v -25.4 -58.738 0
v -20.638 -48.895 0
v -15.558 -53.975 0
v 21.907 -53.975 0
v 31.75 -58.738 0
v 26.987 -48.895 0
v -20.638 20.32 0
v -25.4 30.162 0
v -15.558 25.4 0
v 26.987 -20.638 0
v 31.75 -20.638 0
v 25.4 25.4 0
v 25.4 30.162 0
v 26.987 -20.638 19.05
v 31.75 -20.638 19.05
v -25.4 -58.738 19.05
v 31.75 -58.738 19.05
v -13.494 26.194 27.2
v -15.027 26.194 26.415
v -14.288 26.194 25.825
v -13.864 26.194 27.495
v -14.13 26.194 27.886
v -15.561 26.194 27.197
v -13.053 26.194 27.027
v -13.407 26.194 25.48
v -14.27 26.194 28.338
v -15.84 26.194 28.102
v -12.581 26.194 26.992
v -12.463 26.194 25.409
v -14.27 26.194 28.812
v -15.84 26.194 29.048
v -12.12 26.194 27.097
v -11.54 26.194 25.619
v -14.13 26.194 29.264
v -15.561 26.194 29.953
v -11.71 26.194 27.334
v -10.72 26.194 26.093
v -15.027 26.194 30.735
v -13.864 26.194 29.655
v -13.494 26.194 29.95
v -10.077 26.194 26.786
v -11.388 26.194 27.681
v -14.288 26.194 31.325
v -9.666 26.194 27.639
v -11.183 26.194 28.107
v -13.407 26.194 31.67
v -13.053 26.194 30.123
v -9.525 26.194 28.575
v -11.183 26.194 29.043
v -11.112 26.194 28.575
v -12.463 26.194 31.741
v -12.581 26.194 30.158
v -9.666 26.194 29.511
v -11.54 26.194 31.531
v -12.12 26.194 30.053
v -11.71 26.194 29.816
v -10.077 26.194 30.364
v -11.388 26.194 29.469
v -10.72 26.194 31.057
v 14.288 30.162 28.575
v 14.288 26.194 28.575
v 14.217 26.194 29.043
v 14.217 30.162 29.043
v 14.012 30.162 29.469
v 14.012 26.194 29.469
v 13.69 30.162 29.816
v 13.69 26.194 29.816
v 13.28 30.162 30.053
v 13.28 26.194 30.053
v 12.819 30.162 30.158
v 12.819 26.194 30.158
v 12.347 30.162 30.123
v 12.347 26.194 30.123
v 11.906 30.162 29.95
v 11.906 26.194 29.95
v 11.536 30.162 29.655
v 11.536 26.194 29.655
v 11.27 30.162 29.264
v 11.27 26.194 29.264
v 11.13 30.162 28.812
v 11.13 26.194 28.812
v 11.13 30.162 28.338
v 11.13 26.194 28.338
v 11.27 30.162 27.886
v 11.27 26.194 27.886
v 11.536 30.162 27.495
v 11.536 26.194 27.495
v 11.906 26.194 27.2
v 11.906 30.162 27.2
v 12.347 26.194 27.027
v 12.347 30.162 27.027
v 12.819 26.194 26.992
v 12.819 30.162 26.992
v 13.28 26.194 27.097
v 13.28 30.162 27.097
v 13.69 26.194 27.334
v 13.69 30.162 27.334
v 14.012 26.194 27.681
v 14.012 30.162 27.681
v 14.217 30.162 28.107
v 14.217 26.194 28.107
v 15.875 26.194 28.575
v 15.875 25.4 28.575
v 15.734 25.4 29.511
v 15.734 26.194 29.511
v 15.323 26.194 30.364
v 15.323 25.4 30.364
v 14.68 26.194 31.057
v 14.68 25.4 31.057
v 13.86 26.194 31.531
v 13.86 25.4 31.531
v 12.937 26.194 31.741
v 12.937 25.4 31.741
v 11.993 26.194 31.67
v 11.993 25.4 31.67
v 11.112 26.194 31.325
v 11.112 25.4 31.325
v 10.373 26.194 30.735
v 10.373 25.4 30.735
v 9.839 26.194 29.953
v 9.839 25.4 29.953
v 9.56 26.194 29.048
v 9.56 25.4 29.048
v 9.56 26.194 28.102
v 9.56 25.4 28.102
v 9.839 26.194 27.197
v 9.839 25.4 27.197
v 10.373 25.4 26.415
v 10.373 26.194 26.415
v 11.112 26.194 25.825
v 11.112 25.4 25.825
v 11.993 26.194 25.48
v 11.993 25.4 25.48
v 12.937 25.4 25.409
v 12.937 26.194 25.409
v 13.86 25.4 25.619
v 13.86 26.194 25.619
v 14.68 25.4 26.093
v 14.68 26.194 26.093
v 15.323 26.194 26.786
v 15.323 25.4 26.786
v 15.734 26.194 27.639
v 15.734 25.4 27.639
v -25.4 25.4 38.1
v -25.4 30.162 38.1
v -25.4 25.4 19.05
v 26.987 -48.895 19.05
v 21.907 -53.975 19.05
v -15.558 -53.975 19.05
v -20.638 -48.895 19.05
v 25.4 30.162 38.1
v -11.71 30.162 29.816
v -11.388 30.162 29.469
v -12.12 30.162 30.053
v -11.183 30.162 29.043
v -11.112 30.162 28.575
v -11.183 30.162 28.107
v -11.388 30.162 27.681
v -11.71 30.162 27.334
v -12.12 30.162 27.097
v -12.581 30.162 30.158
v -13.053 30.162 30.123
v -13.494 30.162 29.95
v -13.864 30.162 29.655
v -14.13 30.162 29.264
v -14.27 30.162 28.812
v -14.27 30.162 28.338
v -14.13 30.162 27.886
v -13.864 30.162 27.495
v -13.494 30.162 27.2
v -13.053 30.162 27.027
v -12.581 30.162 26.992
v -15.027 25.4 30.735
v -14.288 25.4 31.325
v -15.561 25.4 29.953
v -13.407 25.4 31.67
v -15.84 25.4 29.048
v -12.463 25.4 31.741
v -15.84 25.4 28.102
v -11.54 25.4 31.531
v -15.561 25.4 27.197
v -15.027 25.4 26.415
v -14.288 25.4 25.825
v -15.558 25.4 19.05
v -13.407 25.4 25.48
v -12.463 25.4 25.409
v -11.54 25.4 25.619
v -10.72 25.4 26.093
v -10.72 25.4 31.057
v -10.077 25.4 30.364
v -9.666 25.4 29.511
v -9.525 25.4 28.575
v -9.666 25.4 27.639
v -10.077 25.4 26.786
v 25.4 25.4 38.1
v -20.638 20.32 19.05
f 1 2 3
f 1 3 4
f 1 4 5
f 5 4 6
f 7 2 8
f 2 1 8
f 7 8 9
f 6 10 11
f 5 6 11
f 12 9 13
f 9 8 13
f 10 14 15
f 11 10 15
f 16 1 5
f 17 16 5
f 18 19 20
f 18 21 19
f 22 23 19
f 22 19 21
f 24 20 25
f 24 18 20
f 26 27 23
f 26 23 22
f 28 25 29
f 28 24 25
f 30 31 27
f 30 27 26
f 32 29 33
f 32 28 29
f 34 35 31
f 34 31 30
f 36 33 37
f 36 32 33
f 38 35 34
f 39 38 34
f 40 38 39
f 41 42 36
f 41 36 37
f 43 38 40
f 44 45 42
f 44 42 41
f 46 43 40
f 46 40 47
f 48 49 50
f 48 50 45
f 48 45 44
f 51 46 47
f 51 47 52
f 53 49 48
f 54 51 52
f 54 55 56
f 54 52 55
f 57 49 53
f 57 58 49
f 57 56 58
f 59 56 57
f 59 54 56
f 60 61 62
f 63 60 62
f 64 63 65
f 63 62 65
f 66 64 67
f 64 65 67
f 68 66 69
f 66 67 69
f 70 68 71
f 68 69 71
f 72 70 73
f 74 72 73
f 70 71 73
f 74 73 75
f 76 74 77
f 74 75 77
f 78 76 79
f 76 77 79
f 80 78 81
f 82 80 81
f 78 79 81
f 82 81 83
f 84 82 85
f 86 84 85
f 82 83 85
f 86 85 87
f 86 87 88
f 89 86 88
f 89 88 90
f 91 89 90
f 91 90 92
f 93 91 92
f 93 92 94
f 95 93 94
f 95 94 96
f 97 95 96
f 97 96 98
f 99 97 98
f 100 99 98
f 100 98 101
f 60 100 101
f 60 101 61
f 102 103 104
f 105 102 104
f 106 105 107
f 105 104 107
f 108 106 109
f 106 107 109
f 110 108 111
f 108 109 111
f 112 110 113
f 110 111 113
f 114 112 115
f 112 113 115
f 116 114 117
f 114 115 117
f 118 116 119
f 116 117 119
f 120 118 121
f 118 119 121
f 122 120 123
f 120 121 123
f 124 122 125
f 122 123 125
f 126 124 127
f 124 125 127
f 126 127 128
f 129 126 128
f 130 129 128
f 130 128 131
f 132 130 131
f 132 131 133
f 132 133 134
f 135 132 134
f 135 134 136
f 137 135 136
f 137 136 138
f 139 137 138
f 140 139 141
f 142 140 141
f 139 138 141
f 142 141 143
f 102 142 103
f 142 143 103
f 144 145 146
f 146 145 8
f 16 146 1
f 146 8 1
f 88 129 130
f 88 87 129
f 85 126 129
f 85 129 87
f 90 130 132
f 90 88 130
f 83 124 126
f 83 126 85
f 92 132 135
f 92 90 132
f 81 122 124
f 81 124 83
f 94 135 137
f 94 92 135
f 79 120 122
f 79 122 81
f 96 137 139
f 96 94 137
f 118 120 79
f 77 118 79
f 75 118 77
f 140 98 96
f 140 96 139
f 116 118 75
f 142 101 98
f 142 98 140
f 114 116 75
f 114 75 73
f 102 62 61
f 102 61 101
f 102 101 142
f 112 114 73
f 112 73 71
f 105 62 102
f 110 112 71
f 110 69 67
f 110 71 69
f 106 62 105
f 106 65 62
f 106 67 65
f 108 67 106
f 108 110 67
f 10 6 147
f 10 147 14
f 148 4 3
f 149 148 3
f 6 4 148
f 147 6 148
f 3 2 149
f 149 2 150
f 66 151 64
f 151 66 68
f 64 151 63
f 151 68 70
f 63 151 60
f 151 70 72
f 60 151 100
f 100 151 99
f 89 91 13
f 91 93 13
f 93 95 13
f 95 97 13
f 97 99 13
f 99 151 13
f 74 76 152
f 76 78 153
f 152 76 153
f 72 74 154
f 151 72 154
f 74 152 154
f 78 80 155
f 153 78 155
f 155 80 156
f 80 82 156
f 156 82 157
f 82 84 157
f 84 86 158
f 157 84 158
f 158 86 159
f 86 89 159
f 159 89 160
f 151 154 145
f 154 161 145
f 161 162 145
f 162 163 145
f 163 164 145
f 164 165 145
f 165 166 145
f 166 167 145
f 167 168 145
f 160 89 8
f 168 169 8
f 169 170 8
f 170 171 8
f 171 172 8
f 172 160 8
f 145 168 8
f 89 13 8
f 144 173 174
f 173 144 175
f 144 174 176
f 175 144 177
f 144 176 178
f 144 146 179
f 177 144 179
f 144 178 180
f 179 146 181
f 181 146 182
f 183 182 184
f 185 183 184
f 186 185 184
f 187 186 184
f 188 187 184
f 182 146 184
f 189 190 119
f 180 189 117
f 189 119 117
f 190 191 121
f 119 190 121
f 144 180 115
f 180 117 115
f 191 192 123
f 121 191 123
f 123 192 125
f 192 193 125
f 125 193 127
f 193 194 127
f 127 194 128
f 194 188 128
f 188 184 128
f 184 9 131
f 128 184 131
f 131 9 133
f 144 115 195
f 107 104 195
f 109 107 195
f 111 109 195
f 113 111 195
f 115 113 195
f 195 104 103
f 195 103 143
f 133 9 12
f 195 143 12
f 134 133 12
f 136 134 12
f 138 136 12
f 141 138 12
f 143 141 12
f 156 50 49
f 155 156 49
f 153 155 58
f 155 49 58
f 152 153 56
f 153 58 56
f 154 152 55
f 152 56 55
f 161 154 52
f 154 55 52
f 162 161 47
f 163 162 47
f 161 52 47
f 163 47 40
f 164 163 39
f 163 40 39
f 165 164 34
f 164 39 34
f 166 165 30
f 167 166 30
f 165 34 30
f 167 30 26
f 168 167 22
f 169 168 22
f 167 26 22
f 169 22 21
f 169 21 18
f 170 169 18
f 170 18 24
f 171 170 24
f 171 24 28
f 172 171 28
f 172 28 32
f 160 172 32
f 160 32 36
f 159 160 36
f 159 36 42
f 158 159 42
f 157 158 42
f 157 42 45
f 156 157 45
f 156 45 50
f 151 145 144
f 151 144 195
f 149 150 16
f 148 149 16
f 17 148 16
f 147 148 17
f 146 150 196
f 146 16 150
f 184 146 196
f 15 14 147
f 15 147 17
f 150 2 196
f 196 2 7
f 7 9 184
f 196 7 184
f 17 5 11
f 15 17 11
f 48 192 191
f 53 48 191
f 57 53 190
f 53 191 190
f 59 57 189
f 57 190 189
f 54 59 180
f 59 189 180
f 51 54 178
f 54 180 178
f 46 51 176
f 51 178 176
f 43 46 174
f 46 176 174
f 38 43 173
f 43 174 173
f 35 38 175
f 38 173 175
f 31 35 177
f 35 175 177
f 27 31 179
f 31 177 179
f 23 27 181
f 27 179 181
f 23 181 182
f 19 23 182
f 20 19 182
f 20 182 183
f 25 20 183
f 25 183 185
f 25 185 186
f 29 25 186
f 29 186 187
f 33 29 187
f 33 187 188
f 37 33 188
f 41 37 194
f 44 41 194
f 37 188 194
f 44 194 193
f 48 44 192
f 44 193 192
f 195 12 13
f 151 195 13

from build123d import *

# Parameters (mm, degrees)
F0_W     = 4.7625
F0_H     = 33.3375
F1_DEPTH = 19.05
F2_SIZE  = 5.08
F3_DEPTH = 38.1
F4_R     = 3.175
F4_R_2   = 1.5875
F5_DEPTH = 0.79375
F6_DEPTH = 4.7625


with BuildPart() as f1:
    # F0 (on Top) → F1 (new body)
    with BuildSketch(Plane.XY):
        Polygon((-25.4, 30.1625), (-25.4, 25.4), (-20.6375, 25.4), (25.4, 25.4), (25.4, 30.1625), align=None)
        Polygon((-20.6375, 25.4), (-25.4, 25.4), (-25.4, -58.7375), (-20.6375, -58.7375), (-20.6375, -53.975), align=None)
        Polygon((26.9875, -53.975), (-20.6375, -53.975), (-20.6375, -58.7375), (31.75, -58.7375), (31.75, -53.975), align=None)
        with Locations((29.36875, -37.30625)):
            Rectangle(F0_W, F0_H)
    extrude(amount=F1_DEPTH)

    # F2
    f2_edges = [f1.edges().sort_by_distance(p)[0] for p in [
        (-20.6375, -53.975, 9.525),
        (-20.6375, 25.4, 9.525),
        (26.9875, -53.975, 9.525),
    ]]
    chamfer(f2_edges, length=F2_SIZE)

    # F0 (on Top) → F3 (join)
    with BuildSketch(Plane.XY):
        Polygon((-25.4, 30.1625), (-25.4, 25.4), (-20.6375, 25.4), (25.4, 25.4), (25.4, 30.1625), align=None)
    extrude(amount=F3_DEPTH)

    # F4 (on face) → F5 (cut)
    with BuildSketch(Plane.XZ.offset(-25.4)):
        with Locations((-12.7, 28.575)):
            Circle(F4_R)
        with Locations((-12.7, 28.575)):
            Circle(F4_R_2, mode=Mode.SUBTRACT)
        with Locations((12.7, 28.575)):
            Circle(F4_R)
        with Locations((12.7, 28.575)):
            Circle(F4_R_2, mode=Mode.SUBTRACT)
    extrude(amount=-F5_DEPTH, mode=Mode.SUBTRACT)

    # F6 (cut, through all): faces of the model
    f6_faces = [f1.faces().sort_by_distance(p)[0] for p in [
        (-12.7, 25.4, 28.575),
        (12.7, 25.4, 28.575),
    ]]
    extrude(f6_faces, amount=-F6_DEPTH, mode=Mode.SUBTRACT)


solid = f1.part
